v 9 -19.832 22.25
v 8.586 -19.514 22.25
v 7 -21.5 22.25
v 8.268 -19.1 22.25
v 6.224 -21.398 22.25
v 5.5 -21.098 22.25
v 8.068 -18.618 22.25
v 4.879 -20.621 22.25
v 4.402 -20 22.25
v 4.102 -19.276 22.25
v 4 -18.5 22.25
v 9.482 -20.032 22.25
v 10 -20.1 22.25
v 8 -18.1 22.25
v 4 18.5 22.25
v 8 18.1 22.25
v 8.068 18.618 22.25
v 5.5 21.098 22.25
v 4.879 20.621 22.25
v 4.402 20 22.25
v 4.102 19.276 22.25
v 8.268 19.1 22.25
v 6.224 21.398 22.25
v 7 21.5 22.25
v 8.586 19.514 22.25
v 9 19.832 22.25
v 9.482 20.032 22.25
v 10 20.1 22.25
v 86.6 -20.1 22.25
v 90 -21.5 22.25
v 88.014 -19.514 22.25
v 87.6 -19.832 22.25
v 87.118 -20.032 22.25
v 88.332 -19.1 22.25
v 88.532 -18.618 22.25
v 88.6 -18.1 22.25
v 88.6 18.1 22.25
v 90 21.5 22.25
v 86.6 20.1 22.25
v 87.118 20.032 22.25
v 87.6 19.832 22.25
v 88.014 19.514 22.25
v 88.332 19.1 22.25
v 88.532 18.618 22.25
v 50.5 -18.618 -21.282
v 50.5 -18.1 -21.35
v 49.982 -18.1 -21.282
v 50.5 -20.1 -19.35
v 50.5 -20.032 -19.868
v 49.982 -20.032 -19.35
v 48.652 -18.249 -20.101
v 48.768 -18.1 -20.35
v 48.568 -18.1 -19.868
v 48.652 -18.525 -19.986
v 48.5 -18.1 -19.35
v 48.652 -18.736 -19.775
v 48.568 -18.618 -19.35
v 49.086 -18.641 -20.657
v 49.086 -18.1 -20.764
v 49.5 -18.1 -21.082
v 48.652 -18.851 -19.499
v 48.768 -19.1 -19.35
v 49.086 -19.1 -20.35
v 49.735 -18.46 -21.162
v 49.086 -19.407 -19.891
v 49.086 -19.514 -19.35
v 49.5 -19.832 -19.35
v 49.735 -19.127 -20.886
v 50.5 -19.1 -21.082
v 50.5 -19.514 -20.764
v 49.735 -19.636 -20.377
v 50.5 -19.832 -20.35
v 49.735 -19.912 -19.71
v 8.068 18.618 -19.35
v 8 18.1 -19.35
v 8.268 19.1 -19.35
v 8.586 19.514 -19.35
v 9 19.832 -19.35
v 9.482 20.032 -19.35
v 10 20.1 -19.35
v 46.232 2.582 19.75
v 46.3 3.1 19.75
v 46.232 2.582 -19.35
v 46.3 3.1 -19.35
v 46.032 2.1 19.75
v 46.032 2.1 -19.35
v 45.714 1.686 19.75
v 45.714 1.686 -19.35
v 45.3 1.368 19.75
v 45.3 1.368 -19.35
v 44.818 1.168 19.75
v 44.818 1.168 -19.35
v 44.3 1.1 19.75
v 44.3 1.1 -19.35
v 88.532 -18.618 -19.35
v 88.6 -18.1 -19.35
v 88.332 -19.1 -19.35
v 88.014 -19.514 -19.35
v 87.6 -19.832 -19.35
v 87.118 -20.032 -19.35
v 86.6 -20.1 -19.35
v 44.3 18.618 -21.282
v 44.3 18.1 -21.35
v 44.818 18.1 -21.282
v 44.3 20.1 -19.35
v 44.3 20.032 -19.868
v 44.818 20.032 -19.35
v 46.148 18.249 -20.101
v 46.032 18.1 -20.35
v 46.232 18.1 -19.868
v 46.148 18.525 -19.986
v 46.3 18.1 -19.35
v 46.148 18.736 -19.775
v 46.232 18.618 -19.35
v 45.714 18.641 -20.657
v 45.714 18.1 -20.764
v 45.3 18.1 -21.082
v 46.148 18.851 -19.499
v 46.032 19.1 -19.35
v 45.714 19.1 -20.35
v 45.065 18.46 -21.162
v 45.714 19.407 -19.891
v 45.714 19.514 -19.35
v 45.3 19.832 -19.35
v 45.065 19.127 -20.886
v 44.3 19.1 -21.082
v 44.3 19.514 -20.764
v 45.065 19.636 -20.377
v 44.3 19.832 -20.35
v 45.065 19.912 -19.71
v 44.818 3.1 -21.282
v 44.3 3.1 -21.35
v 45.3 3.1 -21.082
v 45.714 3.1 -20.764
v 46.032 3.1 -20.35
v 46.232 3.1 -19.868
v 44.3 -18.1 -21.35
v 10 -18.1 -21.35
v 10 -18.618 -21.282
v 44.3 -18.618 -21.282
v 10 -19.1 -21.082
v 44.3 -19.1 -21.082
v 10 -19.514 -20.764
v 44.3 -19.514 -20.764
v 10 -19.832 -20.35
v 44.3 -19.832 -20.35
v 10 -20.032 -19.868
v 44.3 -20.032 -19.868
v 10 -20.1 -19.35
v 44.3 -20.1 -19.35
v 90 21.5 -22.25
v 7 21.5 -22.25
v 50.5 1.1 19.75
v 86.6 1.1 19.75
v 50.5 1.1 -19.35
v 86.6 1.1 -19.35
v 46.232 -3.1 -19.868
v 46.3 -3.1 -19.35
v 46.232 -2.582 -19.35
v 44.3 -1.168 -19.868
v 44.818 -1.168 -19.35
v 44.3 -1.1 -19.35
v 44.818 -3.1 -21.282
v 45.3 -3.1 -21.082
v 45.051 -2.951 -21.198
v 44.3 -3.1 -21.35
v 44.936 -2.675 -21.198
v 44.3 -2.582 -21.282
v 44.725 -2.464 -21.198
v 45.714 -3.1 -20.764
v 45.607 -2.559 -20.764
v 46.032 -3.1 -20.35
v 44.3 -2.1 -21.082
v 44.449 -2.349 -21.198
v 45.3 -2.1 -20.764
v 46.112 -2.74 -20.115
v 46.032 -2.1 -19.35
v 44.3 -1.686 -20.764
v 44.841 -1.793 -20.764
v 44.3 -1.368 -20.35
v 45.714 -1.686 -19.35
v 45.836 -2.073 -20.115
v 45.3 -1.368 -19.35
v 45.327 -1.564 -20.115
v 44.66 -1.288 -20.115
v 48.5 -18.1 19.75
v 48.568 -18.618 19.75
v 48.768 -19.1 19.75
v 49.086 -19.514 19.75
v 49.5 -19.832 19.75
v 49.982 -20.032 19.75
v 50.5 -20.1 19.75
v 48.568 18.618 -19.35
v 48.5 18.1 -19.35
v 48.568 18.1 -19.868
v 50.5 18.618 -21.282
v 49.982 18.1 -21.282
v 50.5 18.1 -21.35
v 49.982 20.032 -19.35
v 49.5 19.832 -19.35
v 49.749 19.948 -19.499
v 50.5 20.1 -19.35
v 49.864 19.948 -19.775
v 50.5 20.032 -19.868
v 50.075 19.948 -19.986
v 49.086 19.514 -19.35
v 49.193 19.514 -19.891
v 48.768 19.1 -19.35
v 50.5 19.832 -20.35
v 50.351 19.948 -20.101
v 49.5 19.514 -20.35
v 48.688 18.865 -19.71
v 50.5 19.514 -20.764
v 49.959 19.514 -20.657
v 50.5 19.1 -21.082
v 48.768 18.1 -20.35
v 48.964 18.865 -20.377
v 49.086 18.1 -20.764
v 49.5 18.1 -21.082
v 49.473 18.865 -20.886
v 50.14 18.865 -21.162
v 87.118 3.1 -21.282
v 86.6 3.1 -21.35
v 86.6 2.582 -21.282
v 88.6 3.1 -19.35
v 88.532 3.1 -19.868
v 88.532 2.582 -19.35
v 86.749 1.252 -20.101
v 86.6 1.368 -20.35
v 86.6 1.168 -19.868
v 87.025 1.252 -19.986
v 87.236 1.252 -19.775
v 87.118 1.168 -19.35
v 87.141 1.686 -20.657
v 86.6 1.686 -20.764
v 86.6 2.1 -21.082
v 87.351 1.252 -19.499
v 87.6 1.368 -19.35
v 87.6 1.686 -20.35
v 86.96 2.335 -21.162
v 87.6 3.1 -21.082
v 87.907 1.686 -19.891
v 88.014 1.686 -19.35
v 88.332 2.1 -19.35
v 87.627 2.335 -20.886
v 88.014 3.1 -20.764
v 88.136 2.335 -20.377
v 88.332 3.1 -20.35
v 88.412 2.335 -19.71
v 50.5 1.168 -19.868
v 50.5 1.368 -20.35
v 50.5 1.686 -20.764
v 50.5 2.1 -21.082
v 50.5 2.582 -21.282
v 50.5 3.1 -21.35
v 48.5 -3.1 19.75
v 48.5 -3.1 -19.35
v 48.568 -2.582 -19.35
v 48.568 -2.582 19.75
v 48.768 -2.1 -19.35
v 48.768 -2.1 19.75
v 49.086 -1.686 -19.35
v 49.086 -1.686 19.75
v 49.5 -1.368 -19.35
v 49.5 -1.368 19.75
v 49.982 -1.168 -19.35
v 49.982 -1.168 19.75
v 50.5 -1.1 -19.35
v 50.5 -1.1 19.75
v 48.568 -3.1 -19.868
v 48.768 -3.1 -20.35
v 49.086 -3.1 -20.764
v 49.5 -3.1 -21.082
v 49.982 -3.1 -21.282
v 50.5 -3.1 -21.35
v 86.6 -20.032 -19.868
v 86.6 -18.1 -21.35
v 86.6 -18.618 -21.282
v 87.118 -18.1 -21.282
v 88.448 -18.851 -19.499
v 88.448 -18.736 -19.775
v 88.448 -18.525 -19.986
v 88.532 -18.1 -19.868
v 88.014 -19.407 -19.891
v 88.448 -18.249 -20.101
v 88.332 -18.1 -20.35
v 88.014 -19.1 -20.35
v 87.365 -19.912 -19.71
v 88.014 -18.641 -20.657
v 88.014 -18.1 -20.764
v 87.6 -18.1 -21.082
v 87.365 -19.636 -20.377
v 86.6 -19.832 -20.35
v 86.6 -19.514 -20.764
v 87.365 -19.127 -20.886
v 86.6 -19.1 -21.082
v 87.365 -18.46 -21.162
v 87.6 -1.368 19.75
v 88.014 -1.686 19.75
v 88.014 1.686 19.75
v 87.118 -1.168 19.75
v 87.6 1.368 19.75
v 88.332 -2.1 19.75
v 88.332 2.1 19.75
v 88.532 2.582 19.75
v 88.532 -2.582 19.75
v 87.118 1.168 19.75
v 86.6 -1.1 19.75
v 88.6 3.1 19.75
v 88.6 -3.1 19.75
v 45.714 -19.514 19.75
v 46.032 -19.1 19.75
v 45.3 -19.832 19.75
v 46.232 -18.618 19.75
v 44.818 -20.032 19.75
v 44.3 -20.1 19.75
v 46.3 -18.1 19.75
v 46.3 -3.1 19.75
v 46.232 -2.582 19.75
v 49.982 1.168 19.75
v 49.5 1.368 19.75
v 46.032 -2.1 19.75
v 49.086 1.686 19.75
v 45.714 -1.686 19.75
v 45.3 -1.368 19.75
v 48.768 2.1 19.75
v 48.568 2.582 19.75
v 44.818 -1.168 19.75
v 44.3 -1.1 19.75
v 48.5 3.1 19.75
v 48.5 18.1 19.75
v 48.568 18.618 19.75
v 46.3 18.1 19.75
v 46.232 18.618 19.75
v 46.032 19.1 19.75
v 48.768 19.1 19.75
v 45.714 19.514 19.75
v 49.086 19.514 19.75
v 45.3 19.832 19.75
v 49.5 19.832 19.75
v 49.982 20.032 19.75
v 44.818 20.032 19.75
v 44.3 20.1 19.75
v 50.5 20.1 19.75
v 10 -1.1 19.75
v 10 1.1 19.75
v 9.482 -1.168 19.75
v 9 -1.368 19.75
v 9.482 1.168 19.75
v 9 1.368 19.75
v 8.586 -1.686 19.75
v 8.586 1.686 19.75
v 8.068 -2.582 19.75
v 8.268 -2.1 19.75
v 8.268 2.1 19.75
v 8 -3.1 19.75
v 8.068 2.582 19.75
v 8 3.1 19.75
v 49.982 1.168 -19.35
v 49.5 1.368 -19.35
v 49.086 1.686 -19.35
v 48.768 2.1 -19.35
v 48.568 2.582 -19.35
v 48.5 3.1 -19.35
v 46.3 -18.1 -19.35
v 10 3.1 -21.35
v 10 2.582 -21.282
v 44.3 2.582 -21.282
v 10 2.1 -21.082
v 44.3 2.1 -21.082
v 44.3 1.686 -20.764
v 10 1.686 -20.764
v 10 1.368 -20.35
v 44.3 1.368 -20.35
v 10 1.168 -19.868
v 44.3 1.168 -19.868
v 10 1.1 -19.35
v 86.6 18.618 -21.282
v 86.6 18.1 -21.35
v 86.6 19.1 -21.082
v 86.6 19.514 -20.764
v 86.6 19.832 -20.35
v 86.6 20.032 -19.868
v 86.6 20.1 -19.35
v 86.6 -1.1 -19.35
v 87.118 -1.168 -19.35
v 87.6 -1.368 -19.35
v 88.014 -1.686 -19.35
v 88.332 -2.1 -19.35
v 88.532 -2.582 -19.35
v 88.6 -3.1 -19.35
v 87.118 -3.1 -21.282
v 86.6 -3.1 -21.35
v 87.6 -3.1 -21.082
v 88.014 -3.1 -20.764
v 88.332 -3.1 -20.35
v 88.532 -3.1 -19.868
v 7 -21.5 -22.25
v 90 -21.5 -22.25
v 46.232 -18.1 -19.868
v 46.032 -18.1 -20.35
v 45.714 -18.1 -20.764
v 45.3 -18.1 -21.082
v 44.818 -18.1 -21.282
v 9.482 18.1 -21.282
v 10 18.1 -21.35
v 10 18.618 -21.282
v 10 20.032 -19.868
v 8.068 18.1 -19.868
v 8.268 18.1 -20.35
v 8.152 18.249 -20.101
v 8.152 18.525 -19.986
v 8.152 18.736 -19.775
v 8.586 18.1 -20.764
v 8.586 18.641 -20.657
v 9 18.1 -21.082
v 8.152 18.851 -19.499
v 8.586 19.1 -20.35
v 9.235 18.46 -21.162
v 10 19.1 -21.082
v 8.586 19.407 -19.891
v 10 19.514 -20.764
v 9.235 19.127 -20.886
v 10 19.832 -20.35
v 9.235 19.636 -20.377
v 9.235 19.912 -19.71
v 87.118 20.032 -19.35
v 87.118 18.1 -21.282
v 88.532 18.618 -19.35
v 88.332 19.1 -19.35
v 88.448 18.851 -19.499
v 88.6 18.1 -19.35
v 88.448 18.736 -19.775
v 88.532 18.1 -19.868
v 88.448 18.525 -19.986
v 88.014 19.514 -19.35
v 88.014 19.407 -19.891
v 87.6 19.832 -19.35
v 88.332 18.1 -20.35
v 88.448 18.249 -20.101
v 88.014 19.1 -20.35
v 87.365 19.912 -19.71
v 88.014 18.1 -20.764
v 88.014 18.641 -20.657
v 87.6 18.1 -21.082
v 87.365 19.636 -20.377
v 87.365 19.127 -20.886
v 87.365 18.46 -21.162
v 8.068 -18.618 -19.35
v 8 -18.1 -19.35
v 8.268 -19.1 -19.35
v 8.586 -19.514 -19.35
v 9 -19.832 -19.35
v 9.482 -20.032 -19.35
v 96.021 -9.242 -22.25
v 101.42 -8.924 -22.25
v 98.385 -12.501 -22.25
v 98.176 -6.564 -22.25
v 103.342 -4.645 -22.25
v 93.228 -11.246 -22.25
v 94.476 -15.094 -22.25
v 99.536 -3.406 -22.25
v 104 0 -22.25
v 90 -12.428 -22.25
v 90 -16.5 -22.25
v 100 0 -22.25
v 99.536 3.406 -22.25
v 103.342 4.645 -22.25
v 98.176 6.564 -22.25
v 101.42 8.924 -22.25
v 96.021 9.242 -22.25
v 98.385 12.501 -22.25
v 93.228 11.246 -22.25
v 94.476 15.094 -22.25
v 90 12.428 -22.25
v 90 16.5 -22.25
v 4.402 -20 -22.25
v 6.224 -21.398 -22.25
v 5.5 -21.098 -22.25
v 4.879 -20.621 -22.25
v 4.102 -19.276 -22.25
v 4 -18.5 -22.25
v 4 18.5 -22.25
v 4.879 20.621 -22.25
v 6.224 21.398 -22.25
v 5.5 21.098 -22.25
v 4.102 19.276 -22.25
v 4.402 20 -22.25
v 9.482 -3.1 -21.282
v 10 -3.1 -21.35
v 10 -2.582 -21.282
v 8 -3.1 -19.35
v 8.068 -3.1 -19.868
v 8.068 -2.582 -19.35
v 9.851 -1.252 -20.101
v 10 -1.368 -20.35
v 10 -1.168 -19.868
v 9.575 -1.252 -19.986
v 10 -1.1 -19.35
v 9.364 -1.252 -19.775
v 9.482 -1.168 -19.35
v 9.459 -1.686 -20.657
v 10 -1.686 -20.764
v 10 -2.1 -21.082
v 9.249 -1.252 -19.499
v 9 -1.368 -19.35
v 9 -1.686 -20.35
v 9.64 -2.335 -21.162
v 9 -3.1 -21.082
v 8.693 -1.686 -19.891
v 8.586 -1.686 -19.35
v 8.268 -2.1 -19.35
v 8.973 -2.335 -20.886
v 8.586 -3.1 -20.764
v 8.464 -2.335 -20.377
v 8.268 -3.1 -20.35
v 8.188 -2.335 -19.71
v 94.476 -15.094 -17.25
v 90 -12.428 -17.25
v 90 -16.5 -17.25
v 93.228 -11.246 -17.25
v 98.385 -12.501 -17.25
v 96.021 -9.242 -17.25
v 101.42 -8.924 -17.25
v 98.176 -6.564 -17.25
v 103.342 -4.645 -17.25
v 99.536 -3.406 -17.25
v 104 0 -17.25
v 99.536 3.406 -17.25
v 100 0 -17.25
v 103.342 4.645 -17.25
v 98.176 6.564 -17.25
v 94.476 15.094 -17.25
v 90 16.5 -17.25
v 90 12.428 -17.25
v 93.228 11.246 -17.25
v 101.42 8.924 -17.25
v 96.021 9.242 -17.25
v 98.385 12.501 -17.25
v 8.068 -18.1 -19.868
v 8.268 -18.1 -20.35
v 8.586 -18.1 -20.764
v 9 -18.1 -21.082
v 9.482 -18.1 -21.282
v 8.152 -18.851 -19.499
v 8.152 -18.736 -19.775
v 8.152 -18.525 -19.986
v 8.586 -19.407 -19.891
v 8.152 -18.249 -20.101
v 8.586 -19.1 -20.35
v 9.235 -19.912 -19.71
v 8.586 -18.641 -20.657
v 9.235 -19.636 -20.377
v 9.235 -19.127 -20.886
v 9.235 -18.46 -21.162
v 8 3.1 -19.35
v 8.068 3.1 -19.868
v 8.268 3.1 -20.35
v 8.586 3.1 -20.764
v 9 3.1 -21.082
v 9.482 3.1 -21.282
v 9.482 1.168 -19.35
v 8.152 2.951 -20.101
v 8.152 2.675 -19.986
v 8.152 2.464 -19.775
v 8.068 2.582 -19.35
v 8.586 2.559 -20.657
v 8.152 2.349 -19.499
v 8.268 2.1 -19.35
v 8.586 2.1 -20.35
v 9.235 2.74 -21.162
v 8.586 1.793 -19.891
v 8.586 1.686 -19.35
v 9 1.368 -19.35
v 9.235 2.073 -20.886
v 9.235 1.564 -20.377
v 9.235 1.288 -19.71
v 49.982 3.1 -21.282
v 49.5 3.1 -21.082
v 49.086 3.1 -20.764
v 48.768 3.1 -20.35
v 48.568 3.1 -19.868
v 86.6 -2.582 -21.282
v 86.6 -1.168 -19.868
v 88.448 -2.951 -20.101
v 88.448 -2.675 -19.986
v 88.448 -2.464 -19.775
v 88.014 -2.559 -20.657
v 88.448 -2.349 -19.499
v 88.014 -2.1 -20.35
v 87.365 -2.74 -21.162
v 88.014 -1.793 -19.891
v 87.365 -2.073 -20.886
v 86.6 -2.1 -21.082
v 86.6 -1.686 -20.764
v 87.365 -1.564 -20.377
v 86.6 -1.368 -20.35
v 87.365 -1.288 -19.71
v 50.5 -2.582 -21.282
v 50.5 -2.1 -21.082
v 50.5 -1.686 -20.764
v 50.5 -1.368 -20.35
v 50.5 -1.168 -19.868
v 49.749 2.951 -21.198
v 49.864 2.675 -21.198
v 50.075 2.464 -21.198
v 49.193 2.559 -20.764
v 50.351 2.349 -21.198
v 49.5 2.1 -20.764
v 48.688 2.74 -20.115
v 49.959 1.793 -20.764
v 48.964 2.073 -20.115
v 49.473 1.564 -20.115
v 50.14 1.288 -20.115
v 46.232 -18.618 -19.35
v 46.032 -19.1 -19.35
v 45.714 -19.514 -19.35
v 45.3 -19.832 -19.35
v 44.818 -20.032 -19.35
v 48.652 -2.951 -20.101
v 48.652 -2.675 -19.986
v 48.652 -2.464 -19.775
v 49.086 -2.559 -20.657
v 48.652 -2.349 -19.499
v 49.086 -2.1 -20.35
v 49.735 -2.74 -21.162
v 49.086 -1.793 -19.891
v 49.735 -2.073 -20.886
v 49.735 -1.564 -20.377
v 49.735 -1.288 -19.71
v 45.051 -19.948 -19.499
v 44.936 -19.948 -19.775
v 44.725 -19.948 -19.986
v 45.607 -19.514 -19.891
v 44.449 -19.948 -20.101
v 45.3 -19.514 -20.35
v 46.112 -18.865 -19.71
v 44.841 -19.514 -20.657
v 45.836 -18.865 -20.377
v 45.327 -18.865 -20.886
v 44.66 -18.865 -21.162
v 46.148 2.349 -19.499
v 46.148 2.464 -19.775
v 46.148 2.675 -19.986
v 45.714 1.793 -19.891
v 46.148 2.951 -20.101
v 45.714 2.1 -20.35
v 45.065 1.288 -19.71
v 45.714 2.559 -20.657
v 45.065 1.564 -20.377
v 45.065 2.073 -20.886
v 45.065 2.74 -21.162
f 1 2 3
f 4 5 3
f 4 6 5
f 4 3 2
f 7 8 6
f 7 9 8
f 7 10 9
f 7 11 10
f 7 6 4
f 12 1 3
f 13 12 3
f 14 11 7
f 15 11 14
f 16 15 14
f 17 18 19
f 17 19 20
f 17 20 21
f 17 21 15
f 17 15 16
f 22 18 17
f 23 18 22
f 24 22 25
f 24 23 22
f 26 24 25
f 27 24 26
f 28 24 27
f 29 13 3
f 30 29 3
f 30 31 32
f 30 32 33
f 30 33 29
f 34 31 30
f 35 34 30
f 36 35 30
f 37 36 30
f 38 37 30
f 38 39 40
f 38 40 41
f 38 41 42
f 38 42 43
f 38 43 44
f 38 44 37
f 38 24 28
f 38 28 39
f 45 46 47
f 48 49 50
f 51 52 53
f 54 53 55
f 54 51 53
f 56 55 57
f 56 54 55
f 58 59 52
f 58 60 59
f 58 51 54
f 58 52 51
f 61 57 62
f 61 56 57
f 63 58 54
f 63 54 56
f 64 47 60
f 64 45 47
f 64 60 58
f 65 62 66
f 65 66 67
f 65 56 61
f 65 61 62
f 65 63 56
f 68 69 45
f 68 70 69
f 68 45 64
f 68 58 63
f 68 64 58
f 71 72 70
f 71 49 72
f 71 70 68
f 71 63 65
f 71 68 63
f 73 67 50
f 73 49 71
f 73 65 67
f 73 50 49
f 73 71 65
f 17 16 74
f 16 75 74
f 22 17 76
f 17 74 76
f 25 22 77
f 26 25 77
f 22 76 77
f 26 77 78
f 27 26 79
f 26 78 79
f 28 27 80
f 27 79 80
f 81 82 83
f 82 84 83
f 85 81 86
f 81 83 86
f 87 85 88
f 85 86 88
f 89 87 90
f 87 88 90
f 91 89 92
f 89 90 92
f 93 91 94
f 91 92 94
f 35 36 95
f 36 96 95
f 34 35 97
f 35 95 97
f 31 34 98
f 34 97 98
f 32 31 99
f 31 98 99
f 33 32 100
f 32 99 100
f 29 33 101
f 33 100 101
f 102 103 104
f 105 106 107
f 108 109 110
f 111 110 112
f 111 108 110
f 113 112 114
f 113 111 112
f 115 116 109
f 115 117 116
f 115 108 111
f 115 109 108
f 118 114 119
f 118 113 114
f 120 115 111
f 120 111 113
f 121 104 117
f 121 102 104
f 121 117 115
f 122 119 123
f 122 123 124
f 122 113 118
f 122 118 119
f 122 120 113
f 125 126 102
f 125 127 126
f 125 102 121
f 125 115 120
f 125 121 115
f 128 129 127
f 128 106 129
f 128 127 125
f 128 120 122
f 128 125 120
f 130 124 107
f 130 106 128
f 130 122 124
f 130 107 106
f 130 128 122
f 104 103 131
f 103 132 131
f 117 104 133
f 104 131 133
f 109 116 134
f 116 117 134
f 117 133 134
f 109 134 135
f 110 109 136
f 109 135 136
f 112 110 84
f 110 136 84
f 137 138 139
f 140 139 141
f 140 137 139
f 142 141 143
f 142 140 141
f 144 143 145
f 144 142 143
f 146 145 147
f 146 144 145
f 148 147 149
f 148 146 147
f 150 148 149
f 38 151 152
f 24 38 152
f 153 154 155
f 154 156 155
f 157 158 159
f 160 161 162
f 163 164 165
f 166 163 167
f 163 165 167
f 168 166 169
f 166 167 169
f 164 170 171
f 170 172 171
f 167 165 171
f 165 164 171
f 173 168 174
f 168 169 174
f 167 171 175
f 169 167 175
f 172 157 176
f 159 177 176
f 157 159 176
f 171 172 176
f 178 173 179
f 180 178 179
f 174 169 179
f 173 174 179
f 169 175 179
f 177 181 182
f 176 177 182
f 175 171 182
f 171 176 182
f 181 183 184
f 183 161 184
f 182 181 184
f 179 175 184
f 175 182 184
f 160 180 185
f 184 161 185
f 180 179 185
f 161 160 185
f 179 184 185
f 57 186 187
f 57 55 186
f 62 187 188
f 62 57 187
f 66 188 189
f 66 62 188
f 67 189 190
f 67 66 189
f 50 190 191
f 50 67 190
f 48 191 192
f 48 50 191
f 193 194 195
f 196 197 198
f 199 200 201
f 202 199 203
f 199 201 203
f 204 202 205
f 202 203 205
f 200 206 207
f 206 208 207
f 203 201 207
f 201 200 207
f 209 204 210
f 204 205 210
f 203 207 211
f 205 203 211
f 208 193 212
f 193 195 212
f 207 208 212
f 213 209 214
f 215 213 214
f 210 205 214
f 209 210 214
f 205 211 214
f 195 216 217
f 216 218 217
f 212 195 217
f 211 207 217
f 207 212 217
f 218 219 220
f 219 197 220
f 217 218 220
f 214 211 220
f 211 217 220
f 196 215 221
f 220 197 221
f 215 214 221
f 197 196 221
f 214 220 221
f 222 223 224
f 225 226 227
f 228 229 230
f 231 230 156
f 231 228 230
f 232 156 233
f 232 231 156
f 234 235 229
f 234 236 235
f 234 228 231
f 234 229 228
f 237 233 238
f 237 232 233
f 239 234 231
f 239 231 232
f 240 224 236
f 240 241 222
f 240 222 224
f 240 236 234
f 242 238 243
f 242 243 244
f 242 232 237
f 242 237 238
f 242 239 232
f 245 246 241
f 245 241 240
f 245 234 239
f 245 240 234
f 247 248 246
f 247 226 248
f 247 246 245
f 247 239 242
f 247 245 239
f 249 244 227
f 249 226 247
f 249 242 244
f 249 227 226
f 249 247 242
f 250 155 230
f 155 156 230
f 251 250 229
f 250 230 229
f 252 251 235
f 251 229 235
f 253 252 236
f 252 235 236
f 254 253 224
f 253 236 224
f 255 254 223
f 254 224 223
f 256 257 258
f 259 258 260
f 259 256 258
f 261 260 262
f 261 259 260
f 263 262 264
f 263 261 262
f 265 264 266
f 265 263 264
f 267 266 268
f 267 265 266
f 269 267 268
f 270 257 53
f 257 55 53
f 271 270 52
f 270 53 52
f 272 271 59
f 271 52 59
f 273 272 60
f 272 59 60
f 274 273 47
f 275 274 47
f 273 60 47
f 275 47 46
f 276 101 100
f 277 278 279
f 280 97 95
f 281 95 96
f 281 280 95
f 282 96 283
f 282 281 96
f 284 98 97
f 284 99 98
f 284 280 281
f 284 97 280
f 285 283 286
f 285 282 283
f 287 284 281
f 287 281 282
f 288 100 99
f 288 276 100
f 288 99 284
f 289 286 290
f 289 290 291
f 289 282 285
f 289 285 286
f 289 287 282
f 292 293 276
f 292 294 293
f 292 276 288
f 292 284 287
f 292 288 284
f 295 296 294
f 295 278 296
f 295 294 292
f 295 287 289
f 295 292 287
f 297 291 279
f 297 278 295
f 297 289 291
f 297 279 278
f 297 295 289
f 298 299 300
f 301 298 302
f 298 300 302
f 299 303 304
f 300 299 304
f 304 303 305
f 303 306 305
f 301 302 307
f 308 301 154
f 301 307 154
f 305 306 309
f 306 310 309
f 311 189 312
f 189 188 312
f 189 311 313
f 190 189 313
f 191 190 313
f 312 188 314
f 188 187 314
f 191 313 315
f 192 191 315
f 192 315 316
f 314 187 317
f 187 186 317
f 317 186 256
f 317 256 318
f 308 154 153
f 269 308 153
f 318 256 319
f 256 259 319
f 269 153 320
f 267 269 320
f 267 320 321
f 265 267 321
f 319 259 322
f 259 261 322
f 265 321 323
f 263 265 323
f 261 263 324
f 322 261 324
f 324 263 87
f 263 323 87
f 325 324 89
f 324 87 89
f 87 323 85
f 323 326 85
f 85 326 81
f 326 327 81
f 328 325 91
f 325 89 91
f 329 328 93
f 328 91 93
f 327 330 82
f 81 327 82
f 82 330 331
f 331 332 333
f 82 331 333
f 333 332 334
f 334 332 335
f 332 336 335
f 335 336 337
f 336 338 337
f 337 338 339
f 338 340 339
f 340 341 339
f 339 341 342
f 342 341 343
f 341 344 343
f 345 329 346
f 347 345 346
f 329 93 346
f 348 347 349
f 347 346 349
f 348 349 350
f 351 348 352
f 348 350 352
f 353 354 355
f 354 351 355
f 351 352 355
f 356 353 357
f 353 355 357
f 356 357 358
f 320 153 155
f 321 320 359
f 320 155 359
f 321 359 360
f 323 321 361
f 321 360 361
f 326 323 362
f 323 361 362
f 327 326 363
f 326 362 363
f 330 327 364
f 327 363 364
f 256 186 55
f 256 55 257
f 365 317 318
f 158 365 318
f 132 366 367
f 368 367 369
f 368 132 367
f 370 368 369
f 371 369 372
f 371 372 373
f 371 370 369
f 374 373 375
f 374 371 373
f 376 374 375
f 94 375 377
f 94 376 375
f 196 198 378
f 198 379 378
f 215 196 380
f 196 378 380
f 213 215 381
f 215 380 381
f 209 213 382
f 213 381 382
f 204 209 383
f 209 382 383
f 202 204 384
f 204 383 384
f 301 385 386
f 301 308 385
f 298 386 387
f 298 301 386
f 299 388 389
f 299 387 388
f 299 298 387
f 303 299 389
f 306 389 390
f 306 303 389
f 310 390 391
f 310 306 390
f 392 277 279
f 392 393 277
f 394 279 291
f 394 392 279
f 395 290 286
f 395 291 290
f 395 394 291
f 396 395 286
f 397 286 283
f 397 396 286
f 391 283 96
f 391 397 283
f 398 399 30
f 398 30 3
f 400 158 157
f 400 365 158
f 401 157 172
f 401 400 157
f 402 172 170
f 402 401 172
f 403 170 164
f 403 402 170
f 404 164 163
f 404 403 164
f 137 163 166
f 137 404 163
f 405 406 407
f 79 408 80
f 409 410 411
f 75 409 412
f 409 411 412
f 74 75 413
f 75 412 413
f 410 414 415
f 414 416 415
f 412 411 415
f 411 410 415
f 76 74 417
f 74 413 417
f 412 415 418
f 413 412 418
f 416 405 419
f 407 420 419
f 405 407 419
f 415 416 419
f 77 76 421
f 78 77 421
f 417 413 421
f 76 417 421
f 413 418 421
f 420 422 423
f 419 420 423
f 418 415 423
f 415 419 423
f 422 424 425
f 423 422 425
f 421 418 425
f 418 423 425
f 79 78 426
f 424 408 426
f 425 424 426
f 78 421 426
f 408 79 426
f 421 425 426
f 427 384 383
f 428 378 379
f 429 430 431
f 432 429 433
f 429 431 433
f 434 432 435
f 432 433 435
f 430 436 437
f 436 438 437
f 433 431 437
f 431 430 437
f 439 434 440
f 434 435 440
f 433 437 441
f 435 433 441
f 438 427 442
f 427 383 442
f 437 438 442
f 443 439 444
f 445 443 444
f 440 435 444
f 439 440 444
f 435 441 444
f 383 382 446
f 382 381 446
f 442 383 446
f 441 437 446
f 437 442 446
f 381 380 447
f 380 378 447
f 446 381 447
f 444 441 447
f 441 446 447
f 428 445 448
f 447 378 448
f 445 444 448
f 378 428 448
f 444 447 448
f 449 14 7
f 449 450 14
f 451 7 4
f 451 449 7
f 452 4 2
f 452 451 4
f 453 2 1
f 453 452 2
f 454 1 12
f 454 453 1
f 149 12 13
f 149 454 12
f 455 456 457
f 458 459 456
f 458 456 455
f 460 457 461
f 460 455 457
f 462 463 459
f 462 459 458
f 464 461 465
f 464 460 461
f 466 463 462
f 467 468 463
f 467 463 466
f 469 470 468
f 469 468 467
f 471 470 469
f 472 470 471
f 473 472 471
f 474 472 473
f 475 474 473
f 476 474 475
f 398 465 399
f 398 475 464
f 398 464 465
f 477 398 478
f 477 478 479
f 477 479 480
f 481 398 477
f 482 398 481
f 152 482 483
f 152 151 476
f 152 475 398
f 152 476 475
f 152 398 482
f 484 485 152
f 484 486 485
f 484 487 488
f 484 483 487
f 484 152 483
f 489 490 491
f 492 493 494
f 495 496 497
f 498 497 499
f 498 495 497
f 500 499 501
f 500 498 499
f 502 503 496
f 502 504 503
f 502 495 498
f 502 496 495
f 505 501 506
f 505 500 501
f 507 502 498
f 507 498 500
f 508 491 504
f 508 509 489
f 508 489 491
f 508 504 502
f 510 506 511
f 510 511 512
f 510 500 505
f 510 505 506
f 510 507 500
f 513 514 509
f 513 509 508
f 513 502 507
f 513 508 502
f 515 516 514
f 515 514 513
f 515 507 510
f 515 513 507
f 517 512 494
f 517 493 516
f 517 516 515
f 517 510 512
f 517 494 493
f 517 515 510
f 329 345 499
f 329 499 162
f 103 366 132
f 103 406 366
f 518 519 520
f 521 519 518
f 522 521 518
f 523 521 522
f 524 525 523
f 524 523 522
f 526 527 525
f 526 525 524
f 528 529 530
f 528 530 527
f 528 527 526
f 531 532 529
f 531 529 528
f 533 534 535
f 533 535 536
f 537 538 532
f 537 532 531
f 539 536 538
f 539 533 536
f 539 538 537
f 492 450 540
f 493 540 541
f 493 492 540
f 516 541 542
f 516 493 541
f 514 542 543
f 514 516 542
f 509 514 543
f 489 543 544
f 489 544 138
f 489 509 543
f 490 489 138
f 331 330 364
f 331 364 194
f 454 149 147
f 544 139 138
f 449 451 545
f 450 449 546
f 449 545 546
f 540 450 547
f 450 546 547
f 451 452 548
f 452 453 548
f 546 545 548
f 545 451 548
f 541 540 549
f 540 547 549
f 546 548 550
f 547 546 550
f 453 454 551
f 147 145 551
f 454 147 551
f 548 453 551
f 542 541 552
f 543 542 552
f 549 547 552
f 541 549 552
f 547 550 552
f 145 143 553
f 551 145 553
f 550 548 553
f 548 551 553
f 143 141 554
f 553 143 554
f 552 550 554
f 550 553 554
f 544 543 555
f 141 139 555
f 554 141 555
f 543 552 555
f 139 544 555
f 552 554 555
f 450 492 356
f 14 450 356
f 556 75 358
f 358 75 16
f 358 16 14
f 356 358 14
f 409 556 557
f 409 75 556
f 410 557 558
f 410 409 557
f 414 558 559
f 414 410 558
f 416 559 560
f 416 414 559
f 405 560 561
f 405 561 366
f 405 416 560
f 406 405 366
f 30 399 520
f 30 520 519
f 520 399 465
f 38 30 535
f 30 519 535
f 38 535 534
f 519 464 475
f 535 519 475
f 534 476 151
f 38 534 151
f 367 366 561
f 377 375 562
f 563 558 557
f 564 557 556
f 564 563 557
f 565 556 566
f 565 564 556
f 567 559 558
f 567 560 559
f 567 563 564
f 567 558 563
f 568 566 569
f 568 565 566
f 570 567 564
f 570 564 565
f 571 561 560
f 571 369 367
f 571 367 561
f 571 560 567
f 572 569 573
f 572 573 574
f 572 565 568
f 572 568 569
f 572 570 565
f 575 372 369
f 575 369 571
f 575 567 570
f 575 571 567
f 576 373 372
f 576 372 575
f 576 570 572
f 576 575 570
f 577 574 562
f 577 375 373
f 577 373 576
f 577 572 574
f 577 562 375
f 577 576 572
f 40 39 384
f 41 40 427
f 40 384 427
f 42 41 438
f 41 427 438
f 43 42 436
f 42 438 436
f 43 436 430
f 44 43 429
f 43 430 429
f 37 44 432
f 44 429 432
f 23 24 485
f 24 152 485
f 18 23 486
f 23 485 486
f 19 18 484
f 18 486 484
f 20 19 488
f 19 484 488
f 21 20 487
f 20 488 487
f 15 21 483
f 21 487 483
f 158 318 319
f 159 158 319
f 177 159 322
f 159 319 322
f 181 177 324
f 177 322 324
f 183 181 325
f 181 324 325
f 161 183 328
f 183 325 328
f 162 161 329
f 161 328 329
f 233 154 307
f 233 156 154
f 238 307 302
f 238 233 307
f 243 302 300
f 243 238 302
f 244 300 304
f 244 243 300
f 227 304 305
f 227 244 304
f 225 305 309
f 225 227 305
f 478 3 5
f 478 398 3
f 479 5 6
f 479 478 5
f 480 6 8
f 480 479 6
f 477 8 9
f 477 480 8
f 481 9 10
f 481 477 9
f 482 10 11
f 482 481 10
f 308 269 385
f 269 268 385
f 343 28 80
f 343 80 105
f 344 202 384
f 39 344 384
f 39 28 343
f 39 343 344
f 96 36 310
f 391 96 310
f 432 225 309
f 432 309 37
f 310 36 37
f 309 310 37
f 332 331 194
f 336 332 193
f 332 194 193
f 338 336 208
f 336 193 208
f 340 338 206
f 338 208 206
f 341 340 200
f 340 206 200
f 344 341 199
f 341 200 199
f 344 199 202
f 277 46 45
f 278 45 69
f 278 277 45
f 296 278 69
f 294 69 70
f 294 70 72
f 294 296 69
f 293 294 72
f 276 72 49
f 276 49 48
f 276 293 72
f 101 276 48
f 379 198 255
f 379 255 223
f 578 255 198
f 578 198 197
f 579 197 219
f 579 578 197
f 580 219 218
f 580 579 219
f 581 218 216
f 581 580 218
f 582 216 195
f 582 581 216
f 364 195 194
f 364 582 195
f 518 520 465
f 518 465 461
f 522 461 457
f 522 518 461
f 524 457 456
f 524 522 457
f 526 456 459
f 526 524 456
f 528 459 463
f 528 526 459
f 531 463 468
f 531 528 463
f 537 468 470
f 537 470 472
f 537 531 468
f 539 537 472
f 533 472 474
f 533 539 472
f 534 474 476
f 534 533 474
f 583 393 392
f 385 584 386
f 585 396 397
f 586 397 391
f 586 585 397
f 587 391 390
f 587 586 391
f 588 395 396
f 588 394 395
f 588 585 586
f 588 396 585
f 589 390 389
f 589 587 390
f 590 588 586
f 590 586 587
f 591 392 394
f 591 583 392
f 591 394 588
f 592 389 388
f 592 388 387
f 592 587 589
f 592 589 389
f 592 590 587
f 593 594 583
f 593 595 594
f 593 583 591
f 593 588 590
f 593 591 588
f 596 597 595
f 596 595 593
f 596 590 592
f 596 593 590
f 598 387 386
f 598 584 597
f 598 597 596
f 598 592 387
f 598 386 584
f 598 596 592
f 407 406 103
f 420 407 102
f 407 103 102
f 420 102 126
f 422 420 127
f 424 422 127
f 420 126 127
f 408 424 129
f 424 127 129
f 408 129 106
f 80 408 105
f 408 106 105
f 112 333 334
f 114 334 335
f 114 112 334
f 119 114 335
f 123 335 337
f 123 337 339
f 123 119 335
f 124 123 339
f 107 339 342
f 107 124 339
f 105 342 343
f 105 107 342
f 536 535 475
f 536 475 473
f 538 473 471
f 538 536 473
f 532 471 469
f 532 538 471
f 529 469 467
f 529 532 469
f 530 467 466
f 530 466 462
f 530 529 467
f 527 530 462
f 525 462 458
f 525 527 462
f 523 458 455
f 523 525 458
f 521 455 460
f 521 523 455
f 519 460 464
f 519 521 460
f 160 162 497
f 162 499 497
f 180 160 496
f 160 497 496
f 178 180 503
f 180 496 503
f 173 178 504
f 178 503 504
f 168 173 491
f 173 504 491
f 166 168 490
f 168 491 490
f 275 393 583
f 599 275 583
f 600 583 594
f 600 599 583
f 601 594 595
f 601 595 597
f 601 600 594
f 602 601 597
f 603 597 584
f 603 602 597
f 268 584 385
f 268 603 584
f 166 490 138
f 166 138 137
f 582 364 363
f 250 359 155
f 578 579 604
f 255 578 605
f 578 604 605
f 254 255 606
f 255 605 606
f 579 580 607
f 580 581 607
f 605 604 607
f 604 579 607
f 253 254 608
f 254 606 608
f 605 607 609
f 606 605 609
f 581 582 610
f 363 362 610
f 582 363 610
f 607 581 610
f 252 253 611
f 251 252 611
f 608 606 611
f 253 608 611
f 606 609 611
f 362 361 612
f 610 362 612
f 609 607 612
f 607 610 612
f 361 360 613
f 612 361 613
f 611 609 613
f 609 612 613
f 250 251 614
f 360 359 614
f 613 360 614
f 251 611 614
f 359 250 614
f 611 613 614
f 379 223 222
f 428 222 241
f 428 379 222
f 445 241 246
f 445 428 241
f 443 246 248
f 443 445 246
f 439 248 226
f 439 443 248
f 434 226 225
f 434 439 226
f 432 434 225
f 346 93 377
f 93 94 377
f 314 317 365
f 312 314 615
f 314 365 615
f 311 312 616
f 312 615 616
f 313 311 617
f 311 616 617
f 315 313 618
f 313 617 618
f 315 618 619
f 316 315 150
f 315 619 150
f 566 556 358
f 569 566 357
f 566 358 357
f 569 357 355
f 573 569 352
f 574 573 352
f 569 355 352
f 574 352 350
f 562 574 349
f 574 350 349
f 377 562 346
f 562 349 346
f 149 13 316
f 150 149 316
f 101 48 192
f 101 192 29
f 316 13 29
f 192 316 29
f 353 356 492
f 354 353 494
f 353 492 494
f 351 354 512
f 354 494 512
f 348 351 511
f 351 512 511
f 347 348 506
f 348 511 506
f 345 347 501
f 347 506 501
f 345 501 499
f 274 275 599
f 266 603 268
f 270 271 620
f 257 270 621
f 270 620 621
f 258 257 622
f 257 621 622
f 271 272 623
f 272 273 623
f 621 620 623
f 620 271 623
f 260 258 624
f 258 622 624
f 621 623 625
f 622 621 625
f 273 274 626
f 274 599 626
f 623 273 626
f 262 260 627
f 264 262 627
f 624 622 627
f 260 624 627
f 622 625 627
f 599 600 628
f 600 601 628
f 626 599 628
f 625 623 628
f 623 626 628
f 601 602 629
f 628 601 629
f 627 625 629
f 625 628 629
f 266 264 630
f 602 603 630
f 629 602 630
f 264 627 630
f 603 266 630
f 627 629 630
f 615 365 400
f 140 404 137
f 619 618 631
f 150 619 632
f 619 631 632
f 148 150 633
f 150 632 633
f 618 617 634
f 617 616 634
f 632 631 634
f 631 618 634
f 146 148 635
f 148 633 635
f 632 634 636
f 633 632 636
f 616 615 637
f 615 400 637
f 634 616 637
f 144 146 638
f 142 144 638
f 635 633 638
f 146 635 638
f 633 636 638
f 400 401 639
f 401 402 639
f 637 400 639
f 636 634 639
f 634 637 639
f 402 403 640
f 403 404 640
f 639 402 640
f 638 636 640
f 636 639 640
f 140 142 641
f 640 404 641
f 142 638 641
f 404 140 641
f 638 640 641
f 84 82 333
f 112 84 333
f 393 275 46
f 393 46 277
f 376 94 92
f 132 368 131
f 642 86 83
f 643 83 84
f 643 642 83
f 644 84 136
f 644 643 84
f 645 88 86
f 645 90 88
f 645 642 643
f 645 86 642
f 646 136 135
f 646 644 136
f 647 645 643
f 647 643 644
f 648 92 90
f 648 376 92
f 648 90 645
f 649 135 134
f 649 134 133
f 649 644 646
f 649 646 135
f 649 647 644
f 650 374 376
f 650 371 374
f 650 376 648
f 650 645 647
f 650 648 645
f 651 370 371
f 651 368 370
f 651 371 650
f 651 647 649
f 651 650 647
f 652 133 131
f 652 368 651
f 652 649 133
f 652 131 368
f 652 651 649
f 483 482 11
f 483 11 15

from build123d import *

# Parameters (mm, degrees)
SKETCH_1_W                  = 86
SKETCH_1_H                  = 43
EXTRUDE_1_DEPTH             = 39.5
EXTRUDE_2_DEPTH             = 5
SKETCH_3_W                  = 80.6
SKETCH_3_H                  = 40.2
CUT_EXTRUDE_1_DEPTH         = 43.6
HOLE_WIZARD_8_3_8_3_1_D     = 8.3
HOLE_WIZARD_8_3_8_3_1_DEPTH = 3.2
FILLET_1_R                  = 3
EXTRUDE_START               = -4
SKETCH_6_R                  = 4.15
EXTRUDE_3_DEPTH             = 4
EXTRUDE_4_DEPTH             = 42
SKETCH_10_W                 = 2.2
SKETCH_10_H                 = 43
EXTRUDE_5_DEPTH             = 42
FILLET_2_R                  = 2


with BuildPart() as part:
    # Эскиз1 → Бобышка-Вытянуть1 (new body)
    with BuildSketch(Plane.XY.offset(22.25)):
        with Locations((47, 0)):
            Rectangle(SKETCH_1_W, SKETCH_1_H)
    extrude(amount=-EXTRUDE_1_DEPTH)

    # Эскиз2 → Бобышка-Вытянуть2 (add)
    with BuildSketch(Plane(origin=(0, 0, -17.25), x_dir=(-1, 0, 0), z_dir=(0, 0, -1))):
        with BuildLine():
            Line((-90, -21.5), (-90, -16.5))
            ThreePointArc((-90, -16.5), (-104, 0), (-90, 16.5))
            Line((-90, 16.5), (-90, 21.5))
            Line((-90, 21.5), (-4, 21.5))
            Line((-4, 21.5), (-4, -21.5))
            Line((-4, -21.5), (-90, -21.5))
        make_face()
        with BuildLine():
            Line((-90, -12.428366172), (-90, 12.428366172))
            ThreePointArc((-90, 12.428366172), (-100, 0), (-90, -12.428366172))
        make_face(mode=Mode.SUBTRACT)
    extrude(amount=EXTRUDE_2_DEPTH)

    # Эскиз3 → Вырез-Вытянуть1 (cut)
    with BuildSketch(Plane.XY.offset(22.25)):
        with Locations((48.3, 0)):
            Rectangle(SKETCH_3_W, SKETCH_3_H)
    extrude(amount=-CUT_EXTRUDE_1_DEPTH, mode=Mode.SUBTRACT)

    # Диаметр отверстия Ø8.3 (8.3)1
    with Locations(Plane.ZY.offset(-4)):
        with Locations((0, 0)):
            Hole(HOLE_WIZARD_8_3_8_3_1_D / 2, depth=HOLE_WIZARD_8_3_8_3_1_DEPTH)

    # Скругление1
    fillet_1_edges = [part.edges().sort_by_distance(p)[0] for p in [
        (4, -21.5, 0),
        (4, 21.5, 0),
    ]]
    fillet(fillet_1_edges, radius=FILLET_1_R)

    # Эскиз6 → Бобышка-Вытянуть3 (add)
    with BuildSketch(Plane.ZY.offset(-4).offset(EXTRUDE_START)):
        Circle(SKETCH_6_R)
    extrude(amount=EXTRUDE_3_DEPTH)

    # Эскиз7 → Бобышка-Вытянуть4 (add)
    with BuildSketch(Plane(origin=(0, 0, -22.25), x_dir=(-1, 0, 0), z_dir=(0, 0, -1))):
        Polygon((-90, -1.1), (-90, 1.1), (-4, 1.1), (-4, 0), (-4, -1.1), align=None)
    extrude(amount=-EXTRUDE_4_DEPTH)

    # Эскиз10 → Бобышка-Вытянуть5 (add)
    with BuildSketch(Plane(origin=(0, 0, -22.25), x_dir=(-1, 0, 0), z_dir=(0, 0, -1))):
        with Locations((-47.4, 0)):
            Rectangle(SKETCH_10_W, SKETCH_10_H)
    extrude(amount=-EXTRUDE_5_DEPTH)

    # Скругление2
    fillet_2_edges = [part.edges().sort_by_distance(p)[0] for p in [
        (27.15, 1.1, -21.35),
        (48.5, 1.1, -0.8),
        (46.3, 1.1, -0.8),
        (68.55, -1.1, -21.35),
        (27.15, 20.1, -21.35),
        (68.55, -20.1, -21.35),
        (46.3, -1.1, -0.8),
        (46.3, -10.6, -21.35),
        (46.3, 10.6, -21.35),
        (48.5, -10.6, -21.35),
        (48.5, -1.1, -0.8),
        (48.5, 10.6, -21.35),
        (46.3, -20.1, -0.8),
        (46.3, 20.1, -0.8),
        (48.5, -20.1, -0.8),
        (48.5, 20.1, -0.8),
        (27.15, -20.1, -21.35),
        (88.6, -20.1, 0.45),
        (8, 10.6, -21.35),
        (8, -20.1, 0.45),
        (68.55, 20.1, -21.35),
        (8, 20.1, 0.45),
        (88.6, -10.6, -21.35),
        (88.6, 20.1, 0.45),
        (88.6, 10.6, -21.35),
        (8, -10.6, -21.35),
        (68.55, 1.1, -21.35),
        (27.15, -1.1, -21.35),
        (8, -1.1, -0.8),
        (88.6, -1.1, -0.8),
        (8, 1.1, -0.8),
        (88.6, 1.1, -0.8),
    ]]
    fillet(fillet_2_edges, radius=FILLET_2_R)


solid = part.part
